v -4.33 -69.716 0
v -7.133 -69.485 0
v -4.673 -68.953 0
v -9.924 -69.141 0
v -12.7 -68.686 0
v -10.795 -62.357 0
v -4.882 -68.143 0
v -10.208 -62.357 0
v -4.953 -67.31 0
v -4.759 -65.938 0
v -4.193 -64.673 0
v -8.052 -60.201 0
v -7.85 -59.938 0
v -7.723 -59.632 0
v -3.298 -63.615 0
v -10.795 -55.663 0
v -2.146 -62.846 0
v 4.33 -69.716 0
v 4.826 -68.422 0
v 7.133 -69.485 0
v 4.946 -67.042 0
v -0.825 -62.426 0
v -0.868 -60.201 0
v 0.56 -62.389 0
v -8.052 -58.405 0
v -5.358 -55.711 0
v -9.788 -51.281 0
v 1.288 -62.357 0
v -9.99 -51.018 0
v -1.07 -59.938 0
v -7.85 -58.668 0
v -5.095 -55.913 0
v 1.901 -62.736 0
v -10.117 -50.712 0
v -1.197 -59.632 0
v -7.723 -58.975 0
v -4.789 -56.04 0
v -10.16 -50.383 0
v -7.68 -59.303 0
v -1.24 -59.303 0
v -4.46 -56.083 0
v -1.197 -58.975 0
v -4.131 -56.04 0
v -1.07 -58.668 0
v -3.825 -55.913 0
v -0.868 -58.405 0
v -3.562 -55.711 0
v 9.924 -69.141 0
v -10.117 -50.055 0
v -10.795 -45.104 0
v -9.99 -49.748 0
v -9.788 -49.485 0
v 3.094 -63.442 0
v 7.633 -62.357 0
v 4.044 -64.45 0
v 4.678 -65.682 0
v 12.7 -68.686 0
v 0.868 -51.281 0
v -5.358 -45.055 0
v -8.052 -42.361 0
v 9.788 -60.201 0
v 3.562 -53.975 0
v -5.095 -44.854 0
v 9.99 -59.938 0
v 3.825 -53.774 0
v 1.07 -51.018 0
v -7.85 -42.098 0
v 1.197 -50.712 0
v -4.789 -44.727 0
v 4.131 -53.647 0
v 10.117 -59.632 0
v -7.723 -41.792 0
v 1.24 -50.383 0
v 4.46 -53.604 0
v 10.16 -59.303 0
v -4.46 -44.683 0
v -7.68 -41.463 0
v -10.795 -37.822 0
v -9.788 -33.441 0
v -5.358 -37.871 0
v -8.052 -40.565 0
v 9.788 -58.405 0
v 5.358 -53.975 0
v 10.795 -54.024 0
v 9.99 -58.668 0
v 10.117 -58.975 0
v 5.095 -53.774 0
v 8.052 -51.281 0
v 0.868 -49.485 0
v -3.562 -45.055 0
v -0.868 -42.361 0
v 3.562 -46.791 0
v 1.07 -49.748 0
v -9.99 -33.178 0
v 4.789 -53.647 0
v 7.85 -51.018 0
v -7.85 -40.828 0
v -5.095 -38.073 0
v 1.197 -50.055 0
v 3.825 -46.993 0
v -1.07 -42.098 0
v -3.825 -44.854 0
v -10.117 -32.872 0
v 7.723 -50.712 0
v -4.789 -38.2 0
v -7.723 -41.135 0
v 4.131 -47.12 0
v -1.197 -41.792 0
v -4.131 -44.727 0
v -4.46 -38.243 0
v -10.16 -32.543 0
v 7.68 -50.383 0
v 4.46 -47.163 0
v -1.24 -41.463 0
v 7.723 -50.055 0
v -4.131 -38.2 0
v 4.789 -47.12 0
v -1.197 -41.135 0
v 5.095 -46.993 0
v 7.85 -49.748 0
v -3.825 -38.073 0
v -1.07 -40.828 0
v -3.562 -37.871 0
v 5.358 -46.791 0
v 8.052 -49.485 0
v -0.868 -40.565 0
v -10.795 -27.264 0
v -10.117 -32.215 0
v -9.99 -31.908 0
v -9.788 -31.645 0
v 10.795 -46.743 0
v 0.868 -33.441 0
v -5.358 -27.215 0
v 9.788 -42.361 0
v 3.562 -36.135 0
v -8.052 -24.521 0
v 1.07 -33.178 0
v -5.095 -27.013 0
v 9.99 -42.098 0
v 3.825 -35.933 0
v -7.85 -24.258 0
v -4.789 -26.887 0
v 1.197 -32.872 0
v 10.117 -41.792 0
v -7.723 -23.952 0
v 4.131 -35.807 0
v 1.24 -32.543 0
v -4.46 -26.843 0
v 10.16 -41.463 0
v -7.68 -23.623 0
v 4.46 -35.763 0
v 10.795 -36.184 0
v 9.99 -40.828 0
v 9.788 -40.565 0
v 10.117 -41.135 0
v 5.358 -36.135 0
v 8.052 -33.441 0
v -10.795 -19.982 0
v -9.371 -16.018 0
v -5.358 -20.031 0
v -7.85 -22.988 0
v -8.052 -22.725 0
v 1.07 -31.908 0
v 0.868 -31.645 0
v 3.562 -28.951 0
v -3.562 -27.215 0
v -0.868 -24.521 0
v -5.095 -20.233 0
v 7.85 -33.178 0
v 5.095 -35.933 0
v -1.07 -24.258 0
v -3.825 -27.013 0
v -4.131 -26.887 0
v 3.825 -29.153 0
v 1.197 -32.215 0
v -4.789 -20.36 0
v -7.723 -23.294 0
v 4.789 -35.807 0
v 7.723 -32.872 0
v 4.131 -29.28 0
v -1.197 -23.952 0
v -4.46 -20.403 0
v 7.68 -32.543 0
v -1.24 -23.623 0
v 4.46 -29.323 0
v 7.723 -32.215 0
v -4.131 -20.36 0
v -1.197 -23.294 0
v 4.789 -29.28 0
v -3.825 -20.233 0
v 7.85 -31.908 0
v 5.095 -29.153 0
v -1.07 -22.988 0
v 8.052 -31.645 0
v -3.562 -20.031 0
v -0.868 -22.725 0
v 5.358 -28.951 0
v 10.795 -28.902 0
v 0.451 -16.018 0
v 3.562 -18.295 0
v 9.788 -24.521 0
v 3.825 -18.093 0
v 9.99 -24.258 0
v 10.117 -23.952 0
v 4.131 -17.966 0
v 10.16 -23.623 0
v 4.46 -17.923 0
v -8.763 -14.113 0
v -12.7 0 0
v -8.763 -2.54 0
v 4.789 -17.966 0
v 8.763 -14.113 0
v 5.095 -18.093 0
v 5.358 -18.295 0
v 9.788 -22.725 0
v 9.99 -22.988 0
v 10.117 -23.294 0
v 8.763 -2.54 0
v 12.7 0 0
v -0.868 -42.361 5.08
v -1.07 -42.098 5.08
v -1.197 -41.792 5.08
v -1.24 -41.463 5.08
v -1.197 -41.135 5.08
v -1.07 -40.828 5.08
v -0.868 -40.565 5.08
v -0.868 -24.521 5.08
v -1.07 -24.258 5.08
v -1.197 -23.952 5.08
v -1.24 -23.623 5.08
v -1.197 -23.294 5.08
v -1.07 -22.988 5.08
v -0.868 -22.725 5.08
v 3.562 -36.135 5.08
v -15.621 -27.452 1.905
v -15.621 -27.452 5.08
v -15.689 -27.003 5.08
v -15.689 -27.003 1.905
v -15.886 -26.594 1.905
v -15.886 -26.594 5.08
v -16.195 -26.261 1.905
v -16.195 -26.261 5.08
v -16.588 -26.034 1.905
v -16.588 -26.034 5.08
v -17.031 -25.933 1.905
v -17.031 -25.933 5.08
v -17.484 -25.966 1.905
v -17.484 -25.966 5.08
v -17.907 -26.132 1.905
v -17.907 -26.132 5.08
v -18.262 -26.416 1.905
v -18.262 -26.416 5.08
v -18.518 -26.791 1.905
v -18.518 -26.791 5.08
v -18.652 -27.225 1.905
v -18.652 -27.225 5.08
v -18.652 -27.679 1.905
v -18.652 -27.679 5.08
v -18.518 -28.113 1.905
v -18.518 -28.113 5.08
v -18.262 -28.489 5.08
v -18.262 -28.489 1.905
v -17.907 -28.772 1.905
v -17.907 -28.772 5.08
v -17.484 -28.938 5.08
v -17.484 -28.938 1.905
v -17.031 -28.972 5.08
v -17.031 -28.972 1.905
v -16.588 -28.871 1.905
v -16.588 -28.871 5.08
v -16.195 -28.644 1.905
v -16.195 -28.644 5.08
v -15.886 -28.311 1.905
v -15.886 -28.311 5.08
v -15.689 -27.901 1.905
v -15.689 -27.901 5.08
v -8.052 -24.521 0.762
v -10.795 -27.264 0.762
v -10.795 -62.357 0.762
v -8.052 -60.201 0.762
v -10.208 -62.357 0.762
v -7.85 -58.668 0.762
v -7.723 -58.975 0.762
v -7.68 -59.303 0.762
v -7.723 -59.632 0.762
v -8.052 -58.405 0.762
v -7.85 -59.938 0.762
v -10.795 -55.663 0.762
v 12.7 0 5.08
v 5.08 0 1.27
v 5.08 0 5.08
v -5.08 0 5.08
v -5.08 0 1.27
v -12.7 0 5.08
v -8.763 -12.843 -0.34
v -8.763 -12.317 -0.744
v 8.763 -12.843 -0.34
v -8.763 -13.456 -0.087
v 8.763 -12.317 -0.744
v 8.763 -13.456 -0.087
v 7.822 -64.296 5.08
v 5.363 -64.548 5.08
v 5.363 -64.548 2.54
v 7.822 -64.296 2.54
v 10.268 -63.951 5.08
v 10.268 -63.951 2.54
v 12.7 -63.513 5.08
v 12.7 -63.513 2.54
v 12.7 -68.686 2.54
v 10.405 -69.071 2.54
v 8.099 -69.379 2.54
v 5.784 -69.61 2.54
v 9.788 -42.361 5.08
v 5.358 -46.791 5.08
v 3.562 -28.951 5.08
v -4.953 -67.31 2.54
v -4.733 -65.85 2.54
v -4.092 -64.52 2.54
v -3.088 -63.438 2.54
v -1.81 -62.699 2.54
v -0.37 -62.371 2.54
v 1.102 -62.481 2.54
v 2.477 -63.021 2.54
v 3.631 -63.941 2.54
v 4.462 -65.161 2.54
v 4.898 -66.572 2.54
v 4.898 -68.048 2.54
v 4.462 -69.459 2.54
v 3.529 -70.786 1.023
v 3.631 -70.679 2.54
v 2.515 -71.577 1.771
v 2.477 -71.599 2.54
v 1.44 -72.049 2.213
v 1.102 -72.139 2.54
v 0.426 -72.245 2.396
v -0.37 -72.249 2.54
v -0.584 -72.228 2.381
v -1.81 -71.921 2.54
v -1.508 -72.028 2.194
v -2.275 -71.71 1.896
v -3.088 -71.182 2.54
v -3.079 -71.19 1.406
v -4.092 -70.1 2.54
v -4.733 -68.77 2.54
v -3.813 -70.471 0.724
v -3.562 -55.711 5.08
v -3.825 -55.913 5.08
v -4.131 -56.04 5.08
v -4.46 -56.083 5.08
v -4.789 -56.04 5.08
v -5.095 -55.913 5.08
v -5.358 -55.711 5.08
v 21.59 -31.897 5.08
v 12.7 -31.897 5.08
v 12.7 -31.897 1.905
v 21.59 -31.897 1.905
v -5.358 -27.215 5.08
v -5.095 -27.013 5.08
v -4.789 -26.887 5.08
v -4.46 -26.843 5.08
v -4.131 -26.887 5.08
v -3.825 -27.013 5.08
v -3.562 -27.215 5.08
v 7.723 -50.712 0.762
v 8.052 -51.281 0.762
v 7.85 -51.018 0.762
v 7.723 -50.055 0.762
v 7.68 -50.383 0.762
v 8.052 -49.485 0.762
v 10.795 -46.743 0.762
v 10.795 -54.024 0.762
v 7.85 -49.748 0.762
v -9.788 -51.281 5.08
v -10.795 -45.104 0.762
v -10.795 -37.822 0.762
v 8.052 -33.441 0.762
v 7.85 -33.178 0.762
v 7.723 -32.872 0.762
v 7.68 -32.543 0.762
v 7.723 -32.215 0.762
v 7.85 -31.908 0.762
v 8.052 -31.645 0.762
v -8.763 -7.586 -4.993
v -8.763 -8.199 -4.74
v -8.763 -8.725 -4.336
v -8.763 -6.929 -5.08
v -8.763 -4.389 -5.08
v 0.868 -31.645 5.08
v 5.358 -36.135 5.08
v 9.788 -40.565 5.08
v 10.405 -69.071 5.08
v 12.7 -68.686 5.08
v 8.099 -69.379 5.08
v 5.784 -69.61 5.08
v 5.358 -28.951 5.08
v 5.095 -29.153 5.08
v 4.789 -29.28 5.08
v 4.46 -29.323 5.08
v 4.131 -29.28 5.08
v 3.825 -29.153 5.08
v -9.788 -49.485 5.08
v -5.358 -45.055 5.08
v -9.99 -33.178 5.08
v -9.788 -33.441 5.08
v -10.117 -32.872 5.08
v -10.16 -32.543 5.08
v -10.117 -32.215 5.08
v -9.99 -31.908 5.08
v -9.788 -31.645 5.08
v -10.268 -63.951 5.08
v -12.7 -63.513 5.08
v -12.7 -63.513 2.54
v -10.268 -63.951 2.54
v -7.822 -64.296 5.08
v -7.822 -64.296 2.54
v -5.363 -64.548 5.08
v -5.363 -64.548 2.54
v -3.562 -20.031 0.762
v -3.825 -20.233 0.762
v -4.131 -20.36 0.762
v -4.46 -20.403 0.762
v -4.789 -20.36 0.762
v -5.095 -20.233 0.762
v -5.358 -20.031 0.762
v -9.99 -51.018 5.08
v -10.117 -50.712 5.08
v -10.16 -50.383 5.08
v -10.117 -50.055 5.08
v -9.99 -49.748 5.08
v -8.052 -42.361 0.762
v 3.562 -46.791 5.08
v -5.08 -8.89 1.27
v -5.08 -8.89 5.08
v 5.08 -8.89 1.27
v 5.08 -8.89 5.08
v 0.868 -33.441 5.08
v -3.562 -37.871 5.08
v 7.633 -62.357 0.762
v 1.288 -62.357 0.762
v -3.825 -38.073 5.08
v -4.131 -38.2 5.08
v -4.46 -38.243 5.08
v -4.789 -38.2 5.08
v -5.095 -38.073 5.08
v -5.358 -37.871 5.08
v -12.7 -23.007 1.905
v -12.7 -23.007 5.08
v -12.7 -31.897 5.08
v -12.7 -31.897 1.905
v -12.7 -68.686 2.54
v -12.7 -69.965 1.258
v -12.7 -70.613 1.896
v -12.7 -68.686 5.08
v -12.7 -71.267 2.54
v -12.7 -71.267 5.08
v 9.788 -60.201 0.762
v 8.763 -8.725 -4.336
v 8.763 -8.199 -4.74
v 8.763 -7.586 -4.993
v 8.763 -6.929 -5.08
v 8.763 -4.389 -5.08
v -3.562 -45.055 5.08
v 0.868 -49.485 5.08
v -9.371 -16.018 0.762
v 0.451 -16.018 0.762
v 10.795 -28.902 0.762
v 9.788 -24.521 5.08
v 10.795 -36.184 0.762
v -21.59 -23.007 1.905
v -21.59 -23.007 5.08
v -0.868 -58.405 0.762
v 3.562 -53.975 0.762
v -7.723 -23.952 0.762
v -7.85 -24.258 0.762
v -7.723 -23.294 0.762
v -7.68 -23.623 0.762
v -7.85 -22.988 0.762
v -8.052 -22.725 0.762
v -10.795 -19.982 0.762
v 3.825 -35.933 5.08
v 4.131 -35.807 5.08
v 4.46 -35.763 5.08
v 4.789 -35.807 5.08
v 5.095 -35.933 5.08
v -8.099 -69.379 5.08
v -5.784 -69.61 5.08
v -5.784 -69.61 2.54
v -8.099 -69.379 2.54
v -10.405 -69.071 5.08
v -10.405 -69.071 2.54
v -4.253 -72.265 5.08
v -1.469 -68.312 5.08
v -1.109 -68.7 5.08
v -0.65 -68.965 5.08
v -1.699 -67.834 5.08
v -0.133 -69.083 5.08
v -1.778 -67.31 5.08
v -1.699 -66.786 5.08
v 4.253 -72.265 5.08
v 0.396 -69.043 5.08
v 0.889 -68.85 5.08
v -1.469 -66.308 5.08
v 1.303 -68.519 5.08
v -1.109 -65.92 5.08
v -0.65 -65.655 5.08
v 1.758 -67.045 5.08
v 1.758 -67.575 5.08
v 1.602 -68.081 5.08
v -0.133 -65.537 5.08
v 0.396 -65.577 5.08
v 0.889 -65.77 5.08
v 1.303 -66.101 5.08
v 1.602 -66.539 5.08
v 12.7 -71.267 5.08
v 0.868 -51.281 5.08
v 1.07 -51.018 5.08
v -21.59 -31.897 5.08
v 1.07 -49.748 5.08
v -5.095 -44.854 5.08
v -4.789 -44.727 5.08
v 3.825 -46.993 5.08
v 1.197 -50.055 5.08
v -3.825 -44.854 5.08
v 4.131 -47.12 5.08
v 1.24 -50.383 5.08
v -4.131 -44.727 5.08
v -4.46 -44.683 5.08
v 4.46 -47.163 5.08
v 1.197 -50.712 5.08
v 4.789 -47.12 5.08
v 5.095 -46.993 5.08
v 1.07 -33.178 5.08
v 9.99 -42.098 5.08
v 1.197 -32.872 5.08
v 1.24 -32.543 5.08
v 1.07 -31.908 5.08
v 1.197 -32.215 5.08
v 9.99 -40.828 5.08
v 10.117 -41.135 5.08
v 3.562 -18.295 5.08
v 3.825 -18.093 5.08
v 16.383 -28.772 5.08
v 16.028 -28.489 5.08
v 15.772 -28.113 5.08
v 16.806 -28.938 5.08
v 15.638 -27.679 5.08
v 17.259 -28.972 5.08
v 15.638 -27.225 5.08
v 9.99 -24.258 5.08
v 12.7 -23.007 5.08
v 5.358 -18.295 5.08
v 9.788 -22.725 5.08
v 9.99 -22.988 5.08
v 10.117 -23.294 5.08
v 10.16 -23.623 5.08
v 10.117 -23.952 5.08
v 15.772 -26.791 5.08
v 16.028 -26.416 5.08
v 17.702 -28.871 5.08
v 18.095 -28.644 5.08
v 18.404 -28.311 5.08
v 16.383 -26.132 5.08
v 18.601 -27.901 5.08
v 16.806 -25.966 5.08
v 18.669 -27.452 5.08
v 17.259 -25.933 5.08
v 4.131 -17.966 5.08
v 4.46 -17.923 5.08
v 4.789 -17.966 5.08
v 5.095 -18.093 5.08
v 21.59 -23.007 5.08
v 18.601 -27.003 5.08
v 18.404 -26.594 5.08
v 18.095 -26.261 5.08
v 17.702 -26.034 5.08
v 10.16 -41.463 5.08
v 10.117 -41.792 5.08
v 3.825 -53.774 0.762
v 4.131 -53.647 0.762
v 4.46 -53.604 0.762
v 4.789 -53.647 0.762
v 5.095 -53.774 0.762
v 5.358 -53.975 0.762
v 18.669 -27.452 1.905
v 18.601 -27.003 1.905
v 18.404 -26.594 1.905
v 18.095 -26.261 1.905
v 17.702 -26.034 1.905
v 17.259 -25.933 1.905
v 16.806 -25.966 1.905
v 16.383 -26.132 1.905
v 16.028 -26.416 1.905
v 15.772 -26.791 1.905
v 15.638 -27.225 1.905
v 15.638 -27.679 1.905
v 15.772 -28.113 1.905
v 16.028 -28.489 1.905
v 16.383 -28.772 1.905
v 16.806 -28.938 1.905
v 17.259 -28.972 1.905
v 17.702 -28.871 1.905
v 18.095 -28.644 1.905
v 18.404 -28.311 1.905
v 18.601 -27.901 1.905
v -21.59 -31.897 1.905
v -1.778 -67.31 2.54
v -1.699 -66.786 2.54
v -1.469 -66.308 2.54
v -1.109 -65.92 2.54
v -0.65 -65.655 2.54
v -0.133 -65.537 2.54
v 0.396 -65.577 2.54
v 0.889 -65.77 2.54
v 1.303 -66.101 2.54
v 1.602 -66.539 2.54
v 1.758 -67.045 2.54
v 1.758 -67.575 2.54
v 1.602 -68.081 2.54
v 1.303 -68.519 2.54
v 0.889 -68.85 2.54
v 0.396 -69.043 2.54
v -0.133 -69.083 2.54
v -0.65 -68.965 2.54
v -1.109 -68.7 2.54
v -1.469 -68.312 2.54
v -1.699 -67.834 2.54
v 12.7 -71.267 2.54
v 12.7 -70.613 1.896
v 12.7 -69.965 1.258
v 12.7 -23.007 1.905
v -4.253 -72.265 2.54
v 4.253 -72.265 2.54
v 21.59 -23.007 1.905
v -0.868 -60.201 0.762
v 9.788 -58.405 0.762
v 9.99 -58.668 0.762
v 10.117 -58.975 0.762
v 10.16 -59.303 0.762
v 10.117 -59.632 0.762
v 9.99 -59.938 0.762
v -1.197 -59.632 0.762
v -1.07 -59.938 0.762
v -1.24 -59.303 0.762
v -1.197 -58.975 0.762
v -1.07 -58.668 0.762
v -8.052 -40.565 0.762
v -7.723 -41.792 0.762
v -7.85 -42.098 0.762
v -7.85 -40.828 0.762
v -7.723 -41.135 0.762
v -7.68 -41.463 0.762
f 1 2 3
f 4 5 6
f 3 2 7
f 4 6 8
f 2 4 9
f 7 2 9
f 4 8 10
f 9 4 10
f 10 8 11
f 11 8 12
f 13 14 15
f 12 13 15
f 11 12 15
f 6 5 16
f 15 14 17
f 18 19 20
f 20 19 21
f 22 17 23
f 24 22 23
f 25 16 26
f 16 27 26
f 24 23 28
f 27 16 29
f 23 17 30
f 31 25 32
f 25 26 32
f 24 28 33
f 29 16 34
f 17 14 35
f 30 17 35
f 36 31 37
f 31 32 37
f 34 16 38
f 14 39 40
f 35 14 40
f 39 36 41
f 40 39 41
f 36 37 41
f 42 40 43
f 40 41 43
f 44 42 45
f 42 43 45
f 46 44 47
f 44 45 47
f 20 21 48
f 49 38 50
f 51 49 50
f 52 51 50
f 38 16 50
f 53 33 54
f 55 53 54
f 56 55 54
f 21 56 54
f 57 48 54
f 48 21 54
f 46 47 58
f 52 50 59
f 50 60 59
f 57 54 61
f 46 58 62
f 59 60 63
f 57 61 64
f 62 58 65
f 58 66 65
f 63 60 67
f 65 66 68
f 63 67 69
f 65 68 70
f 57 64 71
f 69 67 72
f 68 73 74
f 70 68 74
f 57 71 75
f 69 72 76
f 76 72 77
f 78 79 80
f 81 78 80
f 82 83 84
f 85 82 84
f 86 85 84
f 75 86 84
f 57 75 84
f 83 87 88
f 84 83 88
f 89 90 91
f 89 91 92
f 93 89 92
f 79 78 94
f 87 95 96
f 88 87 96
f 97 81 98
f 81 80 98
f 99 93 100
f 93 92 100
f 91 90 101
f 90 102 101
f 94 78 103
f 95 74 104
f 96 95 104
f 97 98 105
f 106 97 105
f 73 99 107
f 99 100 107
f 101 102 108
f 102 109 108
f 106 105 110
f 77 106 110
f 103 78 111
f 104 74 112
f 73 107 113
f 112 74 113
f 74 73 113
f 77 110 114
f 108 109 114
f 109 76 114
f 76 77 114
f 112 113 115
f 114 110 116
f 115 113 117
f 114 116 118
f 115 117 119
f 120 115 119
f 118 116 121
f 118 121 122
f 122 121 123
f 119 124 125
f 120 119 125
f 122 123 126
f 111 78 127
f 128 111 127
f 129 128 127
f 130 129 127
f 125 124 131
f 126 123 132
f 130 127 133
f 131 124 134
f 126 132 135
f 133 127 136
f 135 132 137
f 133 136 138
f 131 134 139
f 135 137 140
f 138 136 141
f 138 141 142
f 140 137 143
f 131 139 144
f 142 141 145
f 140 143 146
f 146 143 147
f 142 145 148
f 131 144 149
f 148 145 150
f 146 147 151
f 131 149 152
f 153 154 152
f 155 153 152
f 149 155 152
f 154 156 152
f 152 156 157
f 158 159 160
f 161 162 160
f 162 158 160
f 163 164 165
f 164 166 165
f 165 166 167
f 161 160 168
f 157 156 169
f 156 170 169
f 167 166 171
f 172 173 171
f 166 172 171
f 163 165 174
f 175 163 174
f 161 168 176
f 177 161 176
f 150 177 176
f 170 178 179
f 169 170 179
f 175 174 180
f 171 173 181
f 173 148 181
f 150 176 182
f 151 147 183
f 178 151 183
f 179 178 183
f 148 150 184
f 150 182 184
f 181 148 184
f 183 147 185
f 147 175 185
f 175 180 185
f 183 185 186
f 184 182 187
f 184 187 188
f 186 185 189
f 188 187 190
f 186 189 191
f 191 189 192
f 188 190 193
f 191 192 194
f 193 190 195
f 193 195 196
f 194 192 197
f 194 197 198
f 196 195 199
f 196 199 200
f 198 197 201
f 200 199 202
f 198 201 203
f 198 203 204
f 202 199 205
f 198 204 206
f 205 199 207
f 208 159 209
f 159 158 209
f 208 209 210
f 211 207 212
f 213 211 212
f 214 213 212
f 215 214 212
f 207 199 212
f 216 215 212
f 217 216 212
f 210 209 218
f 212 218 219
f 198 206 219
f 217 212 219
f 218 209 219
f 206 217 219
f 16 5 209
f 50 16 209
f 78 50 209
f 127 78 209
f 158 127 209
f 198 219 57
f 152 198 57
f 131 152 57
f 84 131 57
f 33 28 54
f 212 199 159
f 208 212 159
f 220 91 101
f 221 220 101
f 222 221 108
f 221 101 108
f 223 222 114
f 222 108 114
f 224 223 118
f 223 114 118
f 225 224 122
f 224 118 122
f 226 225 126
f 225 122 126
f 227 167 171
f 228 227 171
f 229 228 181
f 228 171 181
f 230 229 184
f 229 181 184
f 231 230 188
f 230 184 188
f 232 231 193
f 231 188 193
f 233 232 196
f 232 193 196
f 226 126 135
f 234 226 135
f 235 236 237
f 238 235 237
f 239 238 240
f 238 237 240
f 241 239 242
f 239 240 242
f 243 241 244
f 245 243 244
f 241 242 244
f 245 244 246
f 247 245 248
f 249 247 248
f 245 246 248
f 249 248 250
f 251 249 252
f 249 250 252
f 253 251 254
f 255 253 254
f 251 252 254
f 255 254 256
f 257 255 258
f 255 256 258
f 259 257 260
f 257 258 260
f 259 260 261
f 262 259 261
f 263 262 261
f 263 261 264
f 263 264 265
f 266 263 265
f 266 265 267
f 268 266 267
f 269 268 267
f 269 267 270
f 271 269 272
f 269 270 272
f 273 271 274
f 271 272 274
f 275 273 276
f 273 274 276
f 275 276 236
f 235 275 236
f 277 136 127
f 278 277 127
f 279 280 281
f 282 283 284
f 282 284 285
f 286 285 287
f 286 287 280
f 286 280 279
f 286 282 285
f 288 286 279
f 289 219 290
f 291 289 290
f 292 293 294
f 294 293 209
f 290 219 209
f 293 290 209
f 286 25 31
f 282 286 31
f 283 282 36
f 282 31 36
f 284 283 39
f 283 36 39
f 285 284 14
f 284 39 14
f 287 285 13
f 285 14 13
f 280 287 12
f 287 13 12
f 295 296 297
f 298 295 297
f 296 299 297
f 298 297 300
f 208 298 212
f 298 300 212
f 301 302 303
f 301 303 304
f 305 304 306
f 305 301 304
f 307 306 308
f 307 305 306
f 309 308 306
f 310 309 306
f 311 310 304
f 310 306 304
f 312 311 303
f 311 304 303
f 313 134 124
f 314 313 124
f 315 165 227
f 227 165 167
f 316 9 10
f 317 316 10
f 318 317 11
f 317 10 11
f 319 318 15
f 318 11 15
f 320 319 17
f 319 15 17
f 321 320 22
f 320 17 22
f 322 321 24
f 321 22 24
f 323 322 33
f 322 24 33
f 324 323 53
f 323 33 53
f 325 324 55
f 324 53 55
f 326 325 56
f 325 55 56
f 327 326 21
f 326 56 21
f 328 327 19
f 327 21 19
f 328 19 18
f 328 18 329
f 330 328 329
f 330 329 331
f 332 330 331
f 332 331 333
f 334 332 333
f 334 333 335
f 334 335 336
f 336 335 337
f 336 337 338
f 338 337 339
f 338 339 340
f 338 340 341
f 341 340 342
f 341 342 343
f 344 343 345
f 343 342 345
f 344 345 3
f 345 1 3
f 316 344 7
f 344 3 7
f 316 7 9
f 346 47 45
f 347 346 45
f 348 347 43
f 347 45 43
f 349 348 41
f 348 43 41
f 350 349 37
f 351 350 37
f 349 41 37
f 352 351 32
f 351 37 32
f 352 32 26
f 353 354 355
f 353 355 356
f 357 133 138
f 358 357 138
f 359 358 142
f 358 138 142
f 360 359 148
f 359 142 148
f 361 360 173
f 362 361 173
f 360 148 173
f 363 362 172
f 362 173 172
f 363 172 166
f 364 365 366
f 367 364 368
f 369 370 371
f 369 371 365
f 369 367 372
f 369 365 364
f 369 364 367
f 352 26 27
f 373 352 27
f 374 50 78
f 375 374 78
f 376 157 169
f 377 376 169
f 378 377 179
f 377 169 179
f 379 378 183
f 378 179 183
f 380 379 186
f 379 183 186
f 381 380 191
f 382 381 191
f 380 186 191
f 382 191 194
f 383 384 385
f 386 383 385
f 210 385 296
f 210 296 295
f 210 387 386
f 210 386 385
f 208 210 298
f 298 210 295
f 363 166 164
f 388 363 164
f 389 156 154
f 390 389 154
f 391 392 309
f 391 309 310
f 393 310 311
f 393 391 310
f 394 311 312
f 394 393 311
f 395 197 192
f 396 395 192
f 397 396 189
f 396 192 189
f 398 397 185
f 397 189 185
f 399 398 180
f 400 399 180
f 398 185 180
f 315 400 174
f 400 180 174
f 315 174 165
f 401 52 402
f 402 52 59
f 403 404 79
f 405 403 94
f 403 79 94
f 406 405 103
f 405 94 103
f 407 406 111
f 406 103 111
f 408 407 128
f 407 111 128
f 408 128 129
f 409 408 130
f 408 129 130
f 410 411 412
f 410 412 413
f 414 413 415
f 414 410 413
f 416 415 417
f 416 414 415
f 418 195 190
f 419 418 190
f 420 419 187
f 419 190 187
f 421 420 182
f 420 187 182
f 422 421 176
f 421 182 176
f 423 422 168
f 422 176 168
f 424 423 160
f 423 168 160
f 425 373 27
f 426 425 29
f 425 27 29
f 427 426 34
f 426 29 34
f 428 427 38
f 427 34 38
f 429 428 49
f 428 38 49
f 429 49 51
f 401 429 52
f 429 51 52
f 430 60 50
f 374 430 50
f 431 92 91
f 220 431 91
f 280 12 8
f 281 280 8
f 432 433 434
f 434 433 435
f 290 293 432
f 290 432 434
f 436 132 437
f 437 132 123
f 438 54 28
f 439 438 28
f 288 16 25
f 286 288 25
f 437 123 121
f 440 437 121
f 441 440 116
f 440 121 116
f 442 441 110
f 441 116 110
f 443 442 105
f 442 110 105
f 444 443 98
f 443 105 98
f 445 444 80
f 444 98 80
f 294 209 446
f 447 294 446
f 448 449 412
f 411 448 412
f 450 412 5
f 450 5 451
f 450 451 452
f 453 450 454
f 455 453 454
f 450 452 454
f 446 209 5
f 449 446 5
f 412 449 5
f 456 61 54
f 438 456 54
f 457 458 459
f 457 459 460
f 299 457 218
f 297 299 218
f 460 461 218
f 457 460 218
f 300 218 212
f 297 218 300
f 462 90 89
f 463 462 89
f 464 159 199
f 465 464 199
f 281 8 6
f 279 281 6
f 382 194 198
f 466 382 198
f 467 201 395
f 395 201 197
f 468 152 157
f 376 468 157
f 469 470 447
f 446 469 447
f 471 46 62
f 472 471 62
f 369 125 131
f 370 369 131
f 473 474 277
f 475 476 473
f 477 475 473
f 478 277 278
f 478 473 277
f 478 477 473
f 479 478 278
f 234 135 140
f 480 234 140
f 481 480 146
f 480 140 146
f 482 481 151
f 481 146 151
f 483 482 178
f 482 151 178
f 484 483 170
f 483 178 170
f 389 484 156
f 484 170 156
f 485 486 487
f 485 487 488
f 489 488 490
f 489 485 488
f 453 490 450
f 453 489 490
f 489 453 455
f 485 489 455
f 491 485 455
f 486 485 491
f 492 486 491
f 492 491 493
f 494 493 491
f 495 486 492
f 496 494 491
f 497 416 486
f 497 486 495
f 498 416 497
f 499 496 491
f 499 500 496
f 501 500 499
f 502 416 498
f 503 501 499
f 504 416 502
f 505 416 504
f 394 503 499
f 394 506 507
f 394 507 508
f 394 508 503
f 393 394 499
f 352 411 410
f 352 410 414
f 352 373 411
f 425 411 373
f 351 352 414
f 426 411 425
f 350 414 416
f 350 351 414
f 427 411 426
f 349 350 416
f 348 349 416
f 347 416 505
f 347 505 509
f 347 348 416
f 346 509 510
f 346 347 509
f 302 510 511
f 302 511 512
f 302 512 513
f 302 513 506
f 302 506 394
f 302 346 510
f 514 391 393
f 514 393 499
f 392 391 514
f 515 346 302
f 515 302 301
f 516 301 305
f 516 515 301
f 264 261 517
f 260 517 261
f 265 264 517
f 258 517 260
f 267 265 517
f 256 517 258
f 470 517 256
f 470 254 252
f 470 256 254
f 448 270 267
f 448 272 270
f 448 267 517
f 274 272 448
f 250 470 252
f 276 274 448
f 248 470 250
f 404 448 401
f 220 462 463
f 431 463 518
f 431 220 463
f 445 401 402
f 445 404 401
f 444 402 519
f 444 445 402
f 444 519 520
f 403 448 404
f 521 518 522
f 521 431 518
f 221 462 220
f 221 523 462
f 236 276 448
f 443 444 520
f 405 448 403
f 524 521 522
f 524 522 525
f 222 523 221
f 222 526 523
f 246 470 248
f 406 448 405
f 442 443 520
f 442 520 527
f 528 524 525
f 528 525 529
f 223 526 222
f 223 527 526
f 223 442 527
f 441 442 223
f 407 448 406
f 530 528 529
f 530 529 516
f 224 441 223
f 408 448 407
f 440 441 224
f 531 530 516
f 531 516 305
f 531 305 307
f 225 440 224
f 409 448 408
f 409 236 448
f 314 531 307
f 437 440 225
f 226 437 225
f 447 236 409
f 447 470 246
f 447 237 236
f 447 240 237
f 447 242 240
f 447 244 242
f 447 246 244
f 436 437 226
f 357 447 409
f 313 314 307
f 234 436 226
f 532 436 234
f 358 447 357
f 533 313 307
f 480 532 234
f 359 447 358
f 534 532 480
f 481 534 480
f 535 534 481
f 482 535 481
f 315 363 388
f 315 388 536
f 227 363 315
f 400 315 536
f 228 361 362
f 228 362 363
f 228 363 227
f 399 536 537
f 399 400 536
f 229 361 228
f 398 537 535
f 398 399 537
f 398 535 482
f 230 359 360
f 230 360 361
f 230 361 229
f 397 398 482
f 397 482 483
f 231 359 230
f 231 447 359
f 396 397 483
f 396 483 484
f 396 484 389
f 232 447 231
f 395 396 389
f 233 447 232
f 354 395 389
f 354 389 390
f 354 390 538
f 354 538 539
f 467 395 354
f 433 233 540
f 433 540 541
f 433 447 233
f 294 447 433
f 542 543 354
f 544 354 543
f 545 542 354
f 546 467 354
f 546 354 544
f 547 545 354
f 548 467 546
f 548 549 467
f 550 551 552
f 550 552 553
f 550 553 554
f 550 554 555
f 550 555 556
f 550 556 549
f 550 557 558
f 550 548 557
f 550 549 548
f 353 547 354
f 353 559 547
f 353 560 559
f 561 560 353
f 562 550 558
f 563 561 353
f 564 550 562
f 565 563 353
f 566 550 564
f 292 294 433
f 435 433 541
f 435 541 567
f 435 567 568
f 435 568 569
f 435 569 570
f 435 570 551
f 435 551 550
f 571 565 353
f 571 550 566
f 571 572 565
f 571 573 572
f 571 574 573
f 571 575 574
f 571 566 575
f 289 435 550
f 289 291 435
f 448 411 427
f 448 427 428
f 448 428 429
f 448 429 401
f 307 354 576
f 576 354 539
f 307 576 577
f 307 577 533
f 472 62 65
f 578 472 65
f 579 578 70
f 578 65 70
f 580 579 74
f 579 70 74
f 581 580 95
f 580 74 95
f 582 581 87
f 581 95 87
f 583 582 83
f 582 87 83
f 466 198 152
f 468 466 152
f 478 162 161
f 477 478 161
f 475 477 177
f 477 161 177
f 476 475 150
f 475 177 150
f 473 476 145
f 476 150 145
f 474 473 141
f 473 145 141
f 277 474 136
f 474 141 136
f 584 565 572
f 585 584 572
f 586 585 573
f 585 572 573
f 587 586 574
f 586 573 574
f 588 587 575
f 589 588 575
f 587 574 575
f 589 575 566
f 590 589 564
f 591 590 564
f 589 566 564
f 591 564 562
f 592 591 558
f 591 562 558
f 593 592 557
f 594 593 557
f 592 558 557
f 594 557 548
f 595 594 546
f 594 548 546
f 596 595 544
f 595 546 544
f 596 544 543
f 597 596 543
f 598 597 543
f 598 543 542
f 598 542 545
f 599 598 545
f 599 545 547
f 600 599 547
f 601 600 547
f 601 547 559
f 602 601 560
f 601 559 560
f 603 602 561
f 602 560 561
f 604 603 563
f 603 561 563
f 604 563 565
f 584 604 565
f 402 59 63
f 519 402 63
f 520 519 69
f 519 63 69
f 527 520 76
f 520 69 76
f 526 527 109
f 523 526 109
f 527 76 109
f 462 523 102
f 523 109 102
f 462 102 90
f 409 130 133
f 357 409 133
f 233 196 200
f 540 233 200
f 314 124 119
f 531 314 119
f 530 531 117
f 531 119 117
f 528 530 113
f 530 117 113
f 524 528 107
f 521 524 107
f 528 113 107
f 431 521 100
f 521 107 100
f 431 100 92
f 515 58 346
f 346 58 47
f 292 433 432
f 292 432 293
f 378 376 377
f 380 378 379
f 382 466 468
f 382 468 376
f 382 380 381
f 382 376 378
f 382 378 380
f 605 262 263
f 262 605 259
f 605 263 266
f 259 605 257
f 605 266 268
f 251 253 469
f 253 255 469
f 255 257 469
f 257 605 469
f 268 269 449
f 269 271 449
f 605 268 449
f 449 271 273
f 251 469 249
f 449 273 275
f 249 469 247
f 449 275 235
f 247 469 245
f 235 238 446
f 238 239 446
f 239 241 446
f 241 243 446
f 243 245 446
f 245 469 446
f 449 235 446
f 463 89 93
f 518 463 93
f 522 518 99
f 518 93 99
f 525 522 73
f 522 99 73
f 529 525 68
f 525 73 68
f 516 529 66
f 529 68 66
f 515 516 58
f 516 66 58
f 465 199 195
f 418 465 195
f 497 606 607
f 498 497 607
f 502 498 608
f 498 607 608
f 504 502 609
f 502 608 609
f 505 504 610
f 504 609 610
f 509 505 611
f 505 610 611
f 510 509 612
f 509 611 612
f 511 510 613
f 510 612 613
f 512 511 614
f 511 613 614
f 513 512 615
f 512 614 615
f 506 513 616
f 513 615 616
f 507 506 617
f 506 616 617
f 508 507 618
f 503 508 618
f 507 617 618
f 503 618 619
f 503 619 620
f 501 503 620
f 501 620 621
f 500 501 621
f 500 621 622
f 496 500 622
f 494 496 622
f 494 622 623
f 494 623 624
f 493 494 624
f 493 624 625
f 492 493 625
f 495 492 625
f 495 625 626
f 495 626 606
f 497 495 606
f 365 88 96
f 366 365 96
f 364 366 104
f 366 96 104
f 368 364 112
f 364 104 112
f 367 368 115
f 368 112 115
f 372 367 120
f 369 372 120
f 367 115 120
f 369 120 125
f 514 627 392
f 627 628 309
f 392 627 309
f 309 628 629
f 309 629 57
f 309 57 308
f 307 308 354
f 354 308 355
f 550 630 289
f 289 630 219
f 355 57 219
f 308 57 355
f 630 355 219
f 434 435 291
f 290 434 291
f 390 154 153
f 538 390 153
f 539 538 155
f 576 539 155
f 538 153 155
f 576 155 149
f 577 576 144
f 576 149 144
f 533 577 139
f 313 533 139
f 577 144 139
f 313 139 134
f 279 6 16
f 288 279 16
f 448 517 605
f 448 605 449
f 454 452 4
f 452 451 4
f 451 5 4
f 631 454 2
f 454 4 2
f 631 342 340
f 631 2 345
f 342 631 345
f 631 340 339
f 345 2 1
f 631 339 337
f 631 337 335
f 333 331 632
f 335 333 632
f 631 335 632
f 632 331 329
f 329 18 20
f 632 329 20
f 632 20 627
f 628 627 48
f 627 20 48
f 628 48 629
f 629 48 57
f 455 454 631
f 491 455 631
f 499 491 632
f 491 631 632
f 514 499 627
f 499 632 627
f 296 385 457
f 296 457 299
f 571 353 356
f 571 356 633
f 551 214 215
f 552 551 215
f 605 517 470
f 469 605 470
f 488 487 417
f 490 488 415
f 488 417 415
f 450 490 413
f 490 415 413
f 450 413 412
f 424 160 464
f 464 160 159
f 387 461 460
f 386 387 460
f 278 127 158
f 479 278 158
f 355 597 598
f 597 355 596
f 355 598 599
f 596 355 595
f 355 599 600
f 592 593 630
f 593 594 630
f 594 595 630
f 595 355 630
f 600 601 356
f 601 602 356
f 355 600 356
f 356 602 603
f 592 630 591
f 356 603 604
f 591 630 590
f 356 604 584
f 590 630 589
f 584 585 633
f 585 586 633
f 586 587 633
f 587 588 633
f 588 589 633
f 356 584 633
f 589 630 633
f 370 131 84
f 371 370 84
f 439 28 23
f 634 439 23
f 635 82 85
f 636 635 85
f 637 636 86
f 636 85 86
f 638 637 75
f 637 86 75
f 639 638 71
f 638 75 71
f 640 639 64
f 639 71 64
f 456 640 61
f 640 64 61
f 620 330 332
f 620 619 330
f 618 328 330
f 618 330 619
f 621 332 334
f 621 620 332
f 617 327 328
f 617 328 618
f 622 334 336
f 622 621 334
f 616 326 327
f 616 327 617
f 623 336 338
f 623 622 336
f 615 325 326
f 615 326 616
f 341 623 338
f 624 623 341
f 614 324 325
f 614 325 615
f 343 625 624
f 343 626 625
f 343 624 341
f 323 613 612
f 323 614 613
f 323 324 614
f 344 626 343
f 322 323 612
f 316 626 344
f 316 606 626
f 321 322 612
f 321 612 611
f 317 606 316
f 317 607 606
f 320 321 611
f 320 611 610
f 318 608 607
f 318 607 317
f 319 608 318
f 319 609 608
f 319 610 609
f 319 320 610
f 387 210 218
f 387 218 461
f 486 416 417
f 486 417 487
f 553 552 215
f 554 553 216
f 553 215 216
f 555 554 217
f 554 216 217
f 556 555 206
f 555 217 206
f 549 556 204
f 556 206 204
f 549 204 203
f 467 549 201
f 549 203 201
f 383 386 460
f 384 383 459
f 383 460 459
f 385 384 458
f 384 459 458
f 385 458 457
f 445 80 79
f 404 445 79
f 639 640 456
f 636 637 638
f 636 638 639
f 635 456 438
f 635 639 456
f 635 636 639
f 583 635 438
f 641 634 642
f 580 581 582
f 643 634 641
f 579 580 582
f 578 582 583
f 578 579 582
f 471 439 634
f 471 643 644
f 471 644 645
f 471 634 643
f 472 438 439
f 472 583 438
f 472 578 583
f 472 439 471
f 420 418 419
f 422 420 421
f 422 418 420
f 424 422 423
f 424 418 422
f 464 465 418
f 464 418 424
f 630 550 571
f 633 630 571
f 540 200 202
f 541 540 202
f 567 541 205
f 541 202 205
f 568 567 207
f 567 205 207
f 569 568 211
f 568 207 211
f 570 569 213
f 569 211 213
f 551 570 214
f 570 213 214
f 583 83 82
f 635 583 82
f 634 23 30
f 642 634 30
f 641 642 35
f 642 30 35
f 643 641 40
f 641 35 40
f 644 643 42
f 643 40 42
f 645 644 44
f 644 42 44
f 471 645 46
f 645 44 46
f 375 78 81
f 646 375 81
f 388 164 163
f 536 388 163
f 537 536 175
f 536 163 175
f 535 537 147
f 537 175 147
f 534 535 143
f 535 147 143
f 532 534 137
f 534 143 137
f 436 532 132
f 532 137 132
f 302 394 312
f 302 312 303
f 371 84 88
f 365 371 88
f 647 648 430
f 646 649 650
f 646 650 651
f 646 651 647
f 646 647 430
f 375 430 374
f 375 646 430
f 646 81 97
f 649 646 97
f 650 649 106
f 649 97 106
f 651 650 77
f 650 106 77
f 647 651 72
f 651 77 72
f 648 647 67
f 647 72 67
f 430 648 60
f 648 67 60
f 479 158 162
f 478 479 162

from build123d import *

# Parameters (mm, degrees)
BOSS_EXTRUDE1_DEPTH = 5.08
BOSS_EXTRUDE2_DEPTH = 8.763
CHAMFER1_SIZE       = 2.54
CUT_EXTRUDE2_DEPTH  = 6.35
SKETCH6_W           = 10.16
SKETCH6_H           = 8.89
CUT_EXTRUDE3_DEPTH  = 3.81
SKETCH7_R           = 4.953
CUT_EXTRUDE4_DEPTH  = 2.54
SKETCH8_R           = 1.786664303
SKETCH8_R_2         = 1.778
CUT_EXTRUDE5_DEPTH  = 3.54
CUT_EXTRUDE6_DEPTH  = 2.54
CUT_EXTRUDE7_DEPTH  = 0.762
SKETCH11_W          = 8.89
SKETCH11_H          = 8.89
SKETCH11_R          = 1.524
BOSS_EXTRUDE3_DEPTH = 3.175


with BuildPart() as part:
    # Sketch1 → Boss-Extrude1 (new body)
    with BuildSketch(Plane.XY):
        with BuildLine():
            Line((-12.7, 0), (-12.7, -71.267258261))
            ThreePointArc((-12.7, -71.267258261), (0, -72.39), (12.7, -71.267258261))
            Line((12.7, -71.267258261), (12.7, 0))
            Line((12.7, 0), (-12.7, 0))
        make_face()
    extrude(amount=BOSS_EXTRUDE1_DEPTH)

    # Sketch4 → Boss-Extrude2 (add, symmetric)
    with BuildSketch(Plane(origin=(0, 0, 0), x_dir=(0, 0, -1), z_dir=(1, 0, 0))):
        with BuildLine():
            Line((4.336051224, -8.725020014), (0.743948776, -12.317122463))
            ThreePointArc((0.743948776, -12.317122463), (0.193345987, -13.141157769), (0, -14.113173687))
            Line((0, -14.113173687), (0, -2.54))
            Line((0, -2.54), (5.08, -4.38896879))
            Line((5.08, -4.38896879), (5.08, -6.92896879))
            ThreePointArc((5.08, -6.92896879), (4.886654013, -7.900984708), (4.336051224, -8.725020014))
        make_face()
    extrude(amount=BOSS_EXTRUDE2_DEPTH, both=True)

    # Chamfer1
    chamfer1_edges = [part.edges().sort_by_distance(p)[0] for p in [
        (0, -72.39, 0),
    ]]
    chamfer(chamfer1_edges, length=CHAMFER1_SIZE)

    # Sketch5 → Cut-Extrude2 (cut)
    with BuildSketch(Plane(origin=(0, 0, 0), x_dir=(-1, 0, 0), z_dir=(0, 0, -1))):
        with BuildLine():
            Line((-9.788025612, -42.36132736), (-5.358068299, -46.791284673))
            ThreePointArc((-5.358068299, -46.791284673), (-4.460042687, -47.163259061), (-3.562017075, -46.791284673))
            Line((-3.562017075, -46.791284673), (0.867940238, -42.36132736))
            ThreePointArc((0.867940238, -42.36132736), (1.239914626, -41.463301747), (0.867940238, -40.565276135))
            Line((0.867940238, -40.565276135), (-3.562017075, -36.135318822))
            ThreePointArc((-3.562017075, -36.135318822), (-4.460042687, -35.763344434), (-5.358068299, -36.135318822))
            Line((-5.358068299, -36.135318822), (-9.788025612, -40.565276135))
            ThreePointArc((-9.788025612, -40.565276135), (-10.16, -41.463301747), (-9.788025612, -42.36132736))
        make_face()
        with BuildLine():
            Line((-0.867940238, -33.441241986), (3.562017075, -37.871199299))
            ThreePointArc((3.562017075, -37.871199299), (4.460042687, -38.243173687), (5.358068299, -37.871199299))
            Line((5.358068299, -37.871199299), (9.788025612, -33.441241986))
            ThreePointArc((9.788025612, -33.441241986), (10.16, -32.543216374), (9.788025612, -31.645190762))
            Line((9.788025612, -31.645190762), (5.358068299, -27.215233449))
            ThreePointArc((5.358068299, -27.215233449), (4.460042687, -26.843259061), (3.562017075, -27.215233449))
            Line((3.562017075, -27.215233449), (-0.867940238, -31.645190762))
            ThreePointArc((-0.867940238, -31.645190762), (-1.239914626, -32.543216374), (-0.867940238, -33.441241986))
        make_face()
        with BuildLine():
            Line((-9.788025612, -24.521156612), (-5.358068299, -28.951113925))
            ThreePointArc((-5.358068299, -28.951113925), (-4.460042687, -29.323088313), (-3.562017075, -28.951113925))
            Line((-3.562017075, -28.951113925), (0.867940238, -24.521156612))
            ThreePointArc((0.867940238, -24.521156612), (1.239914626, -23.623131), (0.867940238, -22.725105388))
            Line((0.867940238, -22.725105388), (-3.562017075, -18.295148075))
            ThreePointArc((-3.562017075, -18.295148075), (-4.460042687, -17.923173687), (-5.358068299, -18.295148075))
            Line((-5.358068299, -18.295148075), (-9.788025612, -22.725105388))
            ThreePointArc((-9.788025612, -22.725105388), (-10.16, -23.623131), (-9.788025612, -24.521156612))
        make_face()
        with BuildLine():
            Line((-0.867940238, -51.281412733), (3.562017075, -55.711370046))
            ThreePointArc((3.562017075, -55.711370046), (4.460042687, -56.083344434), (5.358068299, -55.711370046))
            Line((5.358068299, -55.711370046), (9.788025612, -51.281412733))
            ThreePointArc((9.788025612, -51.281412733), (10.16, -50.383387121), (9.788025612, -49.485361509))
            Line((9.788025612, -49.485361509), (5.358068299, -45.055404196))
            ThreePointArc((5.358068299, -45.055404196), (4.460042687, -44.683429808), (3.562017075, -45.055404196))
            Line((3.562017075, -45.055404196), (-0.867940238, -49.485361509))
            ThreePointArc((-0.867940238, -49.485361509), (-1.239914626, -50.383387121), (-0.867940238, -51.281412733))
        make_face()
    extrude(amount=-CUT_EXTRUDE2_DEPTH, mode=Mode.SUBTRACT)

    # Sketch6 → Cut-Extrude3 (cut)
    with BuildSketch(Plane.XY.offset(5.08)):
        with Locations((0, -4.445)):
            Rectangle(SKETCH6_W, SKETCH6_H)
    extrude(amount=-CUT_EXTRUDE3_DEPTH, mode=Mode.SUBTRACT)

    # Sketch7 → Cut-Extrude4 (cut)
    with BuildSketch(Plane(origin=(0, 0, 0), x_dir=(-1, 0, 0), z_dir=(0, 0, -1))):
        with Locations((0, -67.31)):
            Circle(SKETCH7_R)
    extrude(amount=-CUT_EXTRUDE4_DEPTH, mode=Mode.SUBTRACT)

    # Sketch8 → Cut-Extrude5 (cut, through all)
    with BuildSketch(Plane(origin=(0, 0, 2.54), x_dir=(-1, 0, 0), z_dir=(0, 0, -1))):
        Circle(SKETCH8_R)
        with Locations((0, -67.31)):
            Circle(SKETCH8_R_2)
    extrude(amount=-CUT_EXTRUDE5_DEPTH, mode=Mode.SUBTRACT)

    # Sketch9 → Cut-Extrude6 (cut)
    with BuildSketch(Plane.XY.offset(5.08)):
        with BuildLine():
            Line((-12.7, -68.685751798), (-12.7, -63.51269873))
            ThreePointArc((-12.7, -63.51269873), (-9.046553162, -64.135113439), (-5.363487601, -64.547547597))
            Line((-5.363487601, -64.547547597), (-5.784153295, -69.610100349))
            ThreePointArc((-5.784153295, -69.610100349), (-9.25362555, -69.234333348), (-12.7, -68.685751798))
        make_face()
        with BuildLine():
            Line((5.784153295, -69.610100349), (5.363487601, -64.547547597))
            ThreePointArc((5.363487601, -64.547547597), (9.046553162, -64.135113439), (12.7, -63.51269873))
            Line((12.7, -63.51269873), (12.7, -68.685751798))
            ThreePointArc((12.7, -68.685751798), (9.25362555, -69.234333348), (5.784153295, -69.610100349))
        make_face()
    extrude(amount=-CUT_EXTRUDE6_DEPTH, mode=Mode.SUBTRACT)

    # Sketch10 → Cut-Extrude7 (cut)
    with BuildSketch(Plane(origin=(0, 0, 0), x_dir=(-1, 0, 0), z_dir=(0, 0, -1))):
        with BuildLine():
            Line((-10.795, -46.742506644), (-10.795, -54.024267598))
            Line((-10.795, -54.024267598), (-8.052145135, -51.281412733))
            ThreePointArc((-8.052145135, -51.281412733), (-7.680170747, -50.383387121), (-8.052145135, -49.485361509))
            Line((-8.052145135, -49.485361509), (-10.795, -46.742506644))
        make_face()
        with BuildLine():
            Line((0.867940238, -58.405446883), (-3.562017075, -53.97548957))
            ThreePointArc((-3.562017075, -53.97548957), (-4.460042687, -53.603515182), (-5.358068299, -53.97548957))
            Line((-5.358068299, -53.97548957), (-9.788025612, -58.405446883))
            ThreePointArc((-9.788025612, -58.405446883), (-10.16, -59.303472495), (-9.788025612, -60.201498107))
            Line((-9.788025612, -60.201498107), (-7.632523719, -62.357))
            Line((-7.632523719, -62.357), (-1.287561655, -62.357))
            Line((-1.287561655, -62.357), (0.867940238, -60.201498107))
            ThreePointArc((0.867940238, -60.201498107), (1.239914626, -59.303472495), (0.867940238, -58.405446883))
        make_face()
        with BuildLine():
            Line((8.052145135, -42.36132736), (10.795, -45.104182224))
            Line((10.795, -45.104182224), (10.795, -37.822421271))
            Line((10.795, -37.822421271), (8.052145135, -40.565276135))
            ThreePointArc((8.052145135, -40.565276135), (7.680170747, -41.463301747), (8.052145135, -42.36132736))
        make_face()
        with BuildLine():
            Line((-10.795, -28.902335897), (-10.795, -36.184096851))
            Line((-10.795, -36.184096851), (-8.052145135, -33.441241986))
            ThreePointArc((-8.052145135, -33.441241986), (-7.680170747, -32.543216374), (-8.052145135, -31.645190762))
            Line((-8.052145135, -31.645190762), (-10.795, -28.902335897))
        make_face()
        with BuildLine():
            Line((9.370923164, -16.018173687), (-0.45083779, -16.018173687))
            Line((-0.45083779, -16.018173687), (3.562017075, -20.031028552))
            ThreePointArc((3.562017075, -20.031028552), (4.460042687, -20.40300294), (5.358068299, -20.031028552))
            Line((5.358068299, -20.031028552), (9.370923164, -16.018173687))
        make_face()
        with BuildLine():
            Line((8.052145135, -24.521156612), (10.795, -27.264011477))
            Line((10.795, -27.264011477), (10.795, -19.982250523))
            Line((10.795, -19.982250523), (8.052145135, -22.725105388))
            ThreePointArc((8.052145135, -22.725105388), (7.680170747, -23.623131), (8.052145135, -24.521156612))
        make_face()
        with BuildLine():
            Line((8.052145135, -60.201498107), (10.207647028, -62.357))
            Line((10.207647028, -62.357), (10.795, -62.357))
            Line((10.795, -62.357), (10.795, -55.662592018))
            Line((10.795, -55.662592018), (8.052145135, -58.405446883))
            ThreePointArc((8.052145135, -58.405446883), (7.680170747, -59.303472495), (8.052145135, -60.201498107))
        make_face()
    extrude(amount=-CUT_EXTRUDE7_DEPTH, mode=Mode.SUBTRACT)

    # Sketch11 → Boss-Extrude3 (add)
    with BuildSketch(Plane.XY.offset(5.08)):
        with Locations((17.145, -27.452258261)):
            Rectangle(SKETCH11_W, SKETCH11_H)
        with Locations((17.145, -27.452258261)):
            Circle(SKETCH11_R, mode=Mode.SUBTRACT)
        with Locations((-17.145, -27.452258261)):
            Rectangle(SKETCH11_W, SKETCH11_H)
        with Locations((-17.145, -27.452258261)):
            Circle(SKETCH11_R, mode=Mode.SUBTRACT)
    extrude(amount=-BOSS_EXTRUDE3_DEPTH)


solid = part.part
